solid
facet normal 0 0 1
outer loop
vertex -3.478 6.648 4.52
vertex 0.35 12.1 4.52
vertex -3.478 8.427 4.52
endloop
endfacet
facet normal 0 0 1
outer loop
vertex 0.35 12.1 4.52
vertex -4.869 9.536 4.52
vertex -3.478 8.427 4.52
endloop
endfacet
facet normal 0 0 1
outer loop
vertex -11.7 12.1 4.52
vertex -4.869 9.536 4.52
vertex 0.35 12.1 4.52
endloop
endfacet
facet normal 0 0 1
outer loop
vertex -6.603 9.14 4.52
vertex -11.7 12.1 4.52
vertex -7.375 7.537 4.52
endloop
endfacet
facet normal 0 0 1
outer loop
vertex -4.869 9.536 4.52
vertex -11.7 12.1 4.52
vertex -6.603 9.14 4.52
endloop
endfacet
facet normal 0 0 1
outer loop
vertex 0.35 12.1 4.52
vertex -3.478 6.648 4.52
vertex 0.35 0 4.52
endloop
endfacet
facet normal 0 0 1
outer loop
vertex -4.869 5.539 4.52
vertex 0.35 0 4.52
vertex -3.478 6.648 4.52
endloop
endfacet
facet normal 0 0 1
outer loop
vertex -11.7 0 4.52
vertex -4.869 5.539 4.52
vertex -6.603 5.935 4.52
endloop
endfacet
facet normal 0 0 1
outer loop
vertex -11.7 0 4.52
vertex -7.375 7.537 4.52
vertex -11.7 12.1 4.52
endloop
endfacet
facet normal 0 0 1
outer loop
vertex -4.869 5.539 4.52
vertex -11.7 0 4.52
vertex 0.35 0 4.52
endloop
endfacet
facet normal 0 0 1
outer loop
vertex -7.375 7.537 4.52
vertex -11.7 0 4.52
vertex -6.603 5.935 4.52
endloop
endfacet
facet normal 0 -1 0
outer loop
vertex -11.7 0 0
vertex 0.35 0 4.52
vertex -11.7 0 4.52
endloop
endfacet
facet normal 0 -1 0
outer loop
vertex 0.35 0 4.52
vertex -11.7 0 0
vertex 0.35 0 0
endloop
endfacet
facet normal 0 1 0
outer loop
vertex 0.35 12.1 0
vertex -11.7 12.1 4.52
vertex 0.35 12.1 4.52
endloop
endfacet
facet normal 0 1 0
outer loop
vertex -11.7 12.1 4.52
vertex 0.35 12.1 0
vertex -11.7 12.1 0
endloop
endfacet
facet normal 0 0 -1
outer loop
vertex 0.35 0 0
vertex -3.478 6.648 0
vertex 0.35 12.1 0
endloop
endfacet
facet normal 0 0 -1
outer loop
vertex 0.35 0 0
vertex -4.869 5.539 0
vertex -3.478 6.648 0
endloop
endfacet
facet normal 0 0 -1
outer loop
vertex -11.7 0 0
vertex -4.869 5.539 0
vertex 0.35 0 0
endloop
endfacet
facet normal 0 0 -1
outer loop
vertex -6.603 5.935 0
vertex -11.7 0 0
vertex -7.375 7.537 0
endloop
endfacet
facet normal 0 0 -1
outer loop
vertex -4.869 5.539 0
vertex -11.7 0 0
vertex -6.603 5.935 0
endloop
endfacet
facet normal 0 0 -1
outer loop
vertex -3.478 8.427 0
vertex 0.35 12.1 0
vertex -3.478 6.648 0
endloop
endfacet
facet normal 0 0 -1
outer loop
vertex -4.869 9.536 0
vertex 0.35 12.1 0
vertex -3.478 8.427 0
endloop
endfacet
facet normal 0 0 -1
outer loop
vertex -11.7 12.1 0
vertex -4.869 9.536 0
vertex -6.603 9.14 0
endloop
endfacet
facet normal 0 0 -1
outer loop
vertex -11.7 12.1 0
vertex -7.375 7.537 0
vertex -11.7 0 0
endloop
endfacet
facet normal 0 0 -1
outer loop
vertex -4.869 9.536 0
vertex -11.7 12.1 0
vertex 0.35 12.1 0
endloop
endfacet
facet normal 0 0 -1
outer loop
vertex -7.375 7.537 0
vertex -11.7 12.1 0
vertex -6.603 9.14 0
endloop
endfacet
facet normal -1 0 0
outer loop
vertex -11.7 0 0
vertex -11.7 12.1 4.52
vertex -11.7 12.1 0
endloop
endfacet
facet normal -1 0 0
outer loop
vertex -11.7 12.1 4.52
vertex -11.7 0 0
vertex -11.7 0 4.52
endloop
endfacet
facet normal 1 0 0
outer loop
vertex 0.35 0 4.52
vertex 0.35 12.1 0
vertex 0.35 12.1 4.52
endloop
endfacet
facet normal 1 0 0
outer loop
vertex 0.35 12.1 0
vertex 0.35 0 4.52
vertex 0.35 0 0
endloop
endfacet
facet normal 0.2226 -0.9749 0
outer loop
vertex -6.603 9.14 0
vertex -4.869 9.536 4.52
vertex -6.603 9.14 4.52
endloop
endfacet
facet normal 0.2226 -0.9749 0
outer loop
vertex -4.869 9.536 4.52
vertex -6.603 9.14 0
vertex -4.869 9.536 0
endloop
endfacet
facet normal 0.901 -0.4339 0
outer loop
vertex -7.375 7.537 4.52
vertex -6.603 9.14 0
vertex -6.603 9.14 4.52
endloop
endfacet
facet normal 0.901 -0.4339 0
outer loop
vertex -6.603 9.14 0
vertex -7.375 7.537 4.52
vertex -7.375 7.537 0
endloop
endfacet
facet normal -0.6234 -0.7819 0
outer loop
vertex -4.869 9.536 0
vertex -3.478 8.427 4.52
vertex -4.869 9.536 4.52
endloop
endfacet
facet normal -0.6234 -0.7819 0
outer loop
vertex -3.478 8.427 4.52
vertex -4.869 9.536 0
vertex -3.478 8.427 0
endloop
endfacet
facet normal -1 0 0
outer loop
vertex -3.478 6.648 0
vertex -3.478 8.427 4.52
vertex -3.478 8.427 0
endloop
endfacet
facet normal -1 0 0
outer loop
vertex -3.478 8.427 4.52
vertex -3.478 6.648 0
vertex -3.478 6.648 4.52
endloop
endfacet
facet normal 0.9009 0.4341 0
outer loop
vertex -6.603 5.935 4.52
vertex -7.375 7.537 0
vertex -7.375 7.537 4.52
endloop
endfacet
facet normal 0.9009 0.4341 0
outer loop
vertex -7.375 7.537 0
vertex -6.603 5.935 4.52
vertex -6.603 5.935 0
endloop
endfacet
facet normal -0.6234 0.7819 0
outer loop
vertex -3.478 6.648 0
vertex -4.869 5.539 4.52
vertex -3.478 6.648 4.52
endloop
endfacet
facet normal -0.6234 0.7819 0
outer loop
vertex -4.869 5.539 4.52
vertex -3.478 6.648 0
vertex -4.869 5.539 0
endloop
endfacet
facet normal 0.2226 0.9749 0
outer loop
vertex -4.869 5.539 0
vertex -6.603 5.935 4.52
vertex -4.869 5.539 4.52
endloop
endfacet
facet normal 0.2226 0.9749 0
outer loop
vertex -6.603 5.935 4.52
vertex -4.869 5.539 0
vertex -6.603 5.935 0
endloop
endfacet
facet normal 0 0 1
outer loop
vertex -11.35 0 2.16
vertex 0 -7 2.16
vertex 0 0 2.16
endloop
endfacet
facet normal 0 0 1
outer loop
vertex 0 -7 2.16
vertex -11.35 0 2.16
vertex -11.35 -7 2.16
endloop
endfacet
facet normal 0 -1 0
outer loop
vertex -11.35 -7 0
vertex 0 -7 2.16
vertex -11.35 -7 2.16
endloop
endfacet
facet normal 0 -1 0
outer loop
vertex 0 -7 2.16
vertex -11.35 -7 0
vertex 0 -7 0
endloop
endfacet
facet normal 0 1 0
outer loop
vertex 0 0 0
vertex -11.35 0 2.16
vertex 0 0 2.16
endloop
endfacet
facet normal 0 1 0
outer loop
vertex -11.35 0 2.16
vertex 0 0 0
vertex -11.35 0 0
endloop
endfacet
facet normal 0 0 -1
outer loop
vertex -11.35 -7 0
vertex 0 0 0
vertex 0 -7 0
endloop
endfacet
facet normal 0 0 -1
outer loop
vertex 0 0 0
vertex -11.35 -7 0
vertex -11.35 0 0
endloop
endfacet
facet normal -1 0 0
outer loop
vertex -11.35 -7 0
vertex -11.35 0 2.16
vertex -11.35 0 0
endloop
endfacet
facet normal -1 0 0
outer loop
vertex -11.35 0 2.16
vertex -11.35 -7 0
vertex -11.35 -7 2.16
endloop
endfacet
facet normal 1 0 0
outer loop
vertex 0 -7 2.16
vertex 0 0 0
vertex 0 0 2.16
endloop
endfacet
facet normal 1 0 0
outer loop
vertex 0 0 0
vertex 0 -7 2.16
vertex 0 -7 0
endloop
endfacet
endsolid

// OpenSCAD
insideThickness=2.16;       // 0.085 inches
insideWidth=11.35;          // 0.447 inches

outsideThickness=4.52;      // 0.178 inches
outsideWidth=insideWidth;   // Easier to print on its side
connectorThickness=0.35;

ringhole=4.1;               // Measures at 0.125 inches.  Sized up a bit to actually fit
depth=7;                    // Measures about 8-9mm max


module usbThing (cScale) {
    rotate(a=[90, -90, 0])
    union() {
        cube([insideThickness*cScale, insideWidth, depth]);
        
        translate([0, -connectorThickness, -ringhole-8])
        difference() {
            cube([outsideThickness, outsideWidth+connectorThickness*2, ringhole+8]);
            
            rotate(a=[-90, 0, 90])
            translate([outsideWidth/2, -2-ringhole*1.25/2, -outsideThickness/2])
            cylinder(r=ringhole/2, h=outsideThickness*1.05, center=true);
        }
    }
}

usbThing(1);  // Print at 100% scale

// Print smaller copies in 2% increments
//
// translate([20, 0, 0])
// usbThing(0.98);
//
// translate([40, 0, 0])
// usbThing(0.96);
//
// translate([60, 0, 0])
// usbThing(0.94);
//
// translate([80, 0, 0])
// usbThing(0.92);
